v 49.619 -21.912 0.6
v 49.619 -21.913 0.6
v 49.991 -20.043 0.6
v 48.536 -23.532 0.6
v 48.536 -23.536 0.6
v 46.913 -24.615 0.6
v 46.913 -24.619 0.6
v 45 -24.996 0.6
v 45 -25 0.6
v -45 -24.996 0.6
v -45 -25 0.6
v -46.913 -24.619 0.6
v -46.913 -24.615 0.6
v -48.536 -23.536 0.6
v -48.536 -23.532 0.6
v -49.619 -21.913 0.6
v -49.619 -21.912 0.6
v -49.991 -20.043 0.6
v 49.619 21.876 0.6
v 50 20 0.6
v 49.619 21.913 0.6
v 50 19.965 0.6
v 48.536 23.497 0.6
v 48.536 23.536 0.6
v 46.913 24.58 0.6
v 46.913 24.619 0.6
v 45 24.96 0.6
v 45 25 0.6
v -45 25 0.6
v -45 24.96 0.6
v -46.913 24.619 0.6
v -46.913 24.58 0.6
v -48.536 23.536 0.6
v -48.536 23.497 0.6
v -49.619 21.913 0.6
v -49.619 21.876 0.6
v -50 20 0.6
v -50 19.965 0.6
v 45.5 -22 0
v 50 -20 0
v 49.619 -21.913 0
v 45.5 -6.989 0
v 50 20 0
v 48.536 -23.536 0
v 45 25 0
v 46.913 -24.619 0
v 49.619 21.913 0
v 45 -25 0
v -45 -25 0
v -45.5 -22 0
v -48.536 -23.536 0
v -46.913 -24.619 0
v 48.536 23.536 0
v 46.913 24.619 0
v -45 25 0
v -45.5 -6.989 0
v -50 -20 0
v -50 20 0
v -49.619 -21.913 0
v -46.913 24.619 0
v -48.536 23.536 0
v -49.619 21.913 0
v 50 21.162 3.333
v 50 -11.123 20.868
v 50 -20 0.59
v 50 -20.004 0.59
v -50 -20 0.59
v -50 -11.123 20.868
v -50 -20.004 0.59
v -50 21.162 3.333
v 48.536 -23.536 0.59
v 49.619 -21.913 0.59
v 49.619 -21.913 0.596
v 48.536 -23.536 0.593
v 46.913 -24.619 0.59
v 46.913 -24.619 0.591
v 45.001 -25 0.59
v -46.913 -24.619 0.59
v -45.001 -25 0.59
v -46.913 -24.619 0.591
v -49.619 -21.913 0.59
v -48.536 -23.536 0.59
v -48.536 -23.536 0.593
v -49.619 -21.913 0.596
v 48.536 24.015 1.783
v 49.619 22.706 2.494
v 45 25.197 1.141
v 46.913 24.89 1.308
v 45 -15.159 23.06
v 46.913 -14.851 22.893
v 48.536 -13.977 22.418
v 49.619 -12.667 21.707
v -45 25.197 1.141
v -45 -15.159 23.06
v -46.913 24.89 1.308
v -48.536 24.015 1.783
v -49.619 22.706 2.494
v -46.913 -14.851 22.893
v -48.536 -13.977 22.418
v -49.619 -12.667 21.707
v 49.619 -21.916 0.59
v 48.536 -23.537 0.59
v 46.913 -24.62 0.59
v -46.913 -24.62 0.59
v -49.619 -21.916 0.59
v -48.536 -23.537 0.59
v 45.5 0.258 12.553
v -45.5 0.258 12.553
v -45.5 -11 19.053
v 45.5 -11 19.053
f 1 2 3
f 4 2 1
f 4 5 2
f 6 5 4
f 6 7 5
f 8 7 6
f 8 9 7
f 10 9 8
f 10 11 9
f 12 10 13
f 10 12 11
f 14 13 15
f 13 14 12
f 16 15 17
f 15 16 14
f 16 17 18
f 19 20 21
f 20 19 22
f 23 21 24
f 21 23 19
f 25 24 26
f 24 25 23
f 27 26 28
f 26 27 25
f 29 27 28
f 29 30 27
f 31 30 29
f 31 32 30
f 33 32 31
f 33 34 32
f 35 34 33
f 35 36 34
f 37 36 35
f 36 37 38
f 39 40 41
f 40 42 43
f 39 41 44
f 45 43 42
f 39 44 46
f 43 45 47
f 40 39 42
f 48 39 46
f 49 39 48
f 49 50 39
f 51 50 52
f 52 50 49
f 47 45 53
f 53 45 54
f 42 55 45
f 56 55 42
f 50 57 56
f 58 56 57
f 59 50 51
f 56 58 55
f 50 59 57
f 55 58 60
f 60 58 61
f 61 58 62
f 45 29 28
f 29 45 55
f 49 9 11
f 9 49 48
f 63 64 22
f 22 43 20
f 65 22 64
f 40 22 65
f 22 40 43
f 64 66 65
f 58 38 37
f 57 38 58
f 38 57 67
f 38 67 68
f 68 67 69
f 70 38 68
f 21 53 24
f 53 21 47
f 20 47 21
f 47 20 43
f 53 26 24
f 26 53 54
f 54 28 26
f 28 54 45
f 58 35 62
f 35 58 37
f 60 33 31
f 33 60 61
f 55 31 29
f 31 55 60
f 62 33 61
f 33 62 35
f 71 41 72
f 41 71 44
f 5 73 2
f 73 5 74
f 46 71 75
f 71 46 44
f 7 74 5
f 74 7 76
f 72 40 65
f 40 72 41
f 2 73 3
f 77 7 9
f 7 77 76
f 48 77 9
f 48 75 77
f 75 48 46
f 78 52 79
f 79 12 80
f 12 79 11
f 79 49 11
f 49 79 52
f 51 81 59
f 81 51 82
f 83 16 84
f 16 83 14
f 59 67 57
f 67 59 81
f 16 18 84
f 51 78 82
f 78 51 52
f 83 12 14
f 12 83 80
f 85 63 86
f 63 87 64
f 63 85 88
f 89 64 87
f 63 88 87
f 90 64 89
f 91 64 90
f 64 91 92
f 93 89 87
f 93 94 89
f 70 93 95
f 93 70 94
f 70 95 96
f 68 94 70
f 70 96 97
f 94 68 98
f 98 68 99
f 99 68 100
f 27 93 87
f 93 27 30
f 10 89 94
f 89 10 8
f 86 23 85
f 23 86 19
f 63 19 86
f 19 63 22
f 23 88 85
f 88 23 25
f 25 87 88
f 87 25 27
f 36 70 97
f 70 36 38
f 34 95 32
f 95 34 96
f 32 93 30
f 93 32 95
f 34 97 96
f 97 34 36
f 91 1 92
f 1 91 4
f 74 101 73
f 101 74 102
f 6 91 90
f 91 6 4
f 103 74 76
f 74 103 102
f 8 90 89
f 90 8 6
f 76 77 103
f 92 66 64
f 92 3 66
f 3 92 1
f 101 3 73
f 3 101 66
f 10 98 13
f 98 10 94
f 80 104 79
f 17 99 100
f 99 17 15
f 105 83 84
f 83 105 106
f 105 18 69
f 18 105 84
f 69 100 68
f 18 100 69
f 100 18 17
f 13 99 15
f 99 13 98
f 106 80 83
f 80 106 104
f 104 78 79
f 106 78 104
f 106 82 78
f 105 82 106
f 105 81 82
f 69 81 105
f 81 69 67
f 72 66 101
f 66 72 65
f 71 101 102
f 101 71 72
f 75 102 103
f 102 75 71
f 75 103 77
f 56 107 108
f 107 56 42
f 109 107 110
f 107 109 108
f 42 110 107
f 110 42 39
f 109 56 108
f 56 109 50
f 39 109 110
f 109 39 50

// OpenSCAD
// [FL_INDEX: keywords="openscad, 3d_parametric, Customizable_Bicolor_Card_Holder, csg_solid" | COT="Parametric OpenSCAD design from 3DCodeverse"]
// Title: Customizable Bicolor Card Holder

// preview[view:south, tilt:bottom]

/* [Global] */

// Load a 150x40 pixel image. This is the artwork for the logo. The background should be black and the logo white. If not, make sure to click the Invert Colors checkbox.
logo = "logo.dat"; // [image_surface:150x40]

// What Z height would you like to pause the printer to change the filament for the logo color (mm)?
z_height = 0.6;

/* [Hidden] */

holder_x = 100;
holder_y = 50;
holder_z = 25;
card_x = 91;
card_y = 13;
card_z = 22;
corner_radius = 5;
box_x = holder_x - (corner_radius * 2);
box_y = holder_y - (corner_radius * 2);
face_z = z_height;
offset_x = (holder_x / 2) - corner_radius;
offset_y = (holder_y / 2) - corner_radius;
logo_x = 90;
logo_y = 24;
scale_x = 150;
scale_y = 40;

difference() {
	translate([0, 0, face_z]) {
		translate([0, 0, -(face_z/2)]) {
			cube([box_x, holder_y, face_z], center=true);
			cube([holder_x, box_y, face_z], center=true);
			translate([ offset_x,  offset_y, 0]) cylinder(h=face_z, r=corner_radius, center=true);
			translate([-offset_x,  offset_y, 0]) cylinder(h=face_z, r=corner_radius, center=true);
			translate([ offset_x, -offset_y, 0]) cylinder(h=face_z, r=corner_radius, center=true);
			translate([-offset_x, -offset_y, 0]) cylinder(h=face_z, r=corner_radius, center=true);
		}
		translate([0, -holder_y / 2, -0.01]) scale([1, 0.898, 1]) rotate([-26, 0, 0]) difference() {
			translate([0, holder_y / 2, holder_z/2]) {
				cube([box_x, holder_y, holder_z], center=true);
				cube([holder_x, box_y, holder_z], center=true);
				translate([ offset_x,  offset_y, 0]) cylinder(h=holder_z, r=corner_radius, center=true);
				translate([-offset_x,  offset_y, 0]) cylinder(h=holder_z, r=corner_radius, center=true);
				translate([ offset_x, -offset_y, 0]) cylinder(h=holder_z, r=corner_radius, center=true);
				translate([-offset_x, -offset_y, 0]) cylinder(h=holder_z, r=corner_radius, center=true);
			}
			rotate([26, 0, 0]) translate([0, holder_y / 2, -holder_z/2]) cube([holder_x + 1, holder_y * 4/3, holder_z], center=true);
		}
	}
	translate([0, -holder_y/2+3, 0]) rotate([-30, 0, 0]) translate([0, card_y/2, 0]) cube([card_x, card_y, card_z*2], center=true);
	translate([0, (logo_y/2)-3, -0.01]) mirror([1,0,0]) rotate([0, 0, 180]) {
		scale([(logo_x)/scale_x, (logo_y)/scale_y, z_height]) surface(file=logo, center=true, convexity=5);
	}
}
